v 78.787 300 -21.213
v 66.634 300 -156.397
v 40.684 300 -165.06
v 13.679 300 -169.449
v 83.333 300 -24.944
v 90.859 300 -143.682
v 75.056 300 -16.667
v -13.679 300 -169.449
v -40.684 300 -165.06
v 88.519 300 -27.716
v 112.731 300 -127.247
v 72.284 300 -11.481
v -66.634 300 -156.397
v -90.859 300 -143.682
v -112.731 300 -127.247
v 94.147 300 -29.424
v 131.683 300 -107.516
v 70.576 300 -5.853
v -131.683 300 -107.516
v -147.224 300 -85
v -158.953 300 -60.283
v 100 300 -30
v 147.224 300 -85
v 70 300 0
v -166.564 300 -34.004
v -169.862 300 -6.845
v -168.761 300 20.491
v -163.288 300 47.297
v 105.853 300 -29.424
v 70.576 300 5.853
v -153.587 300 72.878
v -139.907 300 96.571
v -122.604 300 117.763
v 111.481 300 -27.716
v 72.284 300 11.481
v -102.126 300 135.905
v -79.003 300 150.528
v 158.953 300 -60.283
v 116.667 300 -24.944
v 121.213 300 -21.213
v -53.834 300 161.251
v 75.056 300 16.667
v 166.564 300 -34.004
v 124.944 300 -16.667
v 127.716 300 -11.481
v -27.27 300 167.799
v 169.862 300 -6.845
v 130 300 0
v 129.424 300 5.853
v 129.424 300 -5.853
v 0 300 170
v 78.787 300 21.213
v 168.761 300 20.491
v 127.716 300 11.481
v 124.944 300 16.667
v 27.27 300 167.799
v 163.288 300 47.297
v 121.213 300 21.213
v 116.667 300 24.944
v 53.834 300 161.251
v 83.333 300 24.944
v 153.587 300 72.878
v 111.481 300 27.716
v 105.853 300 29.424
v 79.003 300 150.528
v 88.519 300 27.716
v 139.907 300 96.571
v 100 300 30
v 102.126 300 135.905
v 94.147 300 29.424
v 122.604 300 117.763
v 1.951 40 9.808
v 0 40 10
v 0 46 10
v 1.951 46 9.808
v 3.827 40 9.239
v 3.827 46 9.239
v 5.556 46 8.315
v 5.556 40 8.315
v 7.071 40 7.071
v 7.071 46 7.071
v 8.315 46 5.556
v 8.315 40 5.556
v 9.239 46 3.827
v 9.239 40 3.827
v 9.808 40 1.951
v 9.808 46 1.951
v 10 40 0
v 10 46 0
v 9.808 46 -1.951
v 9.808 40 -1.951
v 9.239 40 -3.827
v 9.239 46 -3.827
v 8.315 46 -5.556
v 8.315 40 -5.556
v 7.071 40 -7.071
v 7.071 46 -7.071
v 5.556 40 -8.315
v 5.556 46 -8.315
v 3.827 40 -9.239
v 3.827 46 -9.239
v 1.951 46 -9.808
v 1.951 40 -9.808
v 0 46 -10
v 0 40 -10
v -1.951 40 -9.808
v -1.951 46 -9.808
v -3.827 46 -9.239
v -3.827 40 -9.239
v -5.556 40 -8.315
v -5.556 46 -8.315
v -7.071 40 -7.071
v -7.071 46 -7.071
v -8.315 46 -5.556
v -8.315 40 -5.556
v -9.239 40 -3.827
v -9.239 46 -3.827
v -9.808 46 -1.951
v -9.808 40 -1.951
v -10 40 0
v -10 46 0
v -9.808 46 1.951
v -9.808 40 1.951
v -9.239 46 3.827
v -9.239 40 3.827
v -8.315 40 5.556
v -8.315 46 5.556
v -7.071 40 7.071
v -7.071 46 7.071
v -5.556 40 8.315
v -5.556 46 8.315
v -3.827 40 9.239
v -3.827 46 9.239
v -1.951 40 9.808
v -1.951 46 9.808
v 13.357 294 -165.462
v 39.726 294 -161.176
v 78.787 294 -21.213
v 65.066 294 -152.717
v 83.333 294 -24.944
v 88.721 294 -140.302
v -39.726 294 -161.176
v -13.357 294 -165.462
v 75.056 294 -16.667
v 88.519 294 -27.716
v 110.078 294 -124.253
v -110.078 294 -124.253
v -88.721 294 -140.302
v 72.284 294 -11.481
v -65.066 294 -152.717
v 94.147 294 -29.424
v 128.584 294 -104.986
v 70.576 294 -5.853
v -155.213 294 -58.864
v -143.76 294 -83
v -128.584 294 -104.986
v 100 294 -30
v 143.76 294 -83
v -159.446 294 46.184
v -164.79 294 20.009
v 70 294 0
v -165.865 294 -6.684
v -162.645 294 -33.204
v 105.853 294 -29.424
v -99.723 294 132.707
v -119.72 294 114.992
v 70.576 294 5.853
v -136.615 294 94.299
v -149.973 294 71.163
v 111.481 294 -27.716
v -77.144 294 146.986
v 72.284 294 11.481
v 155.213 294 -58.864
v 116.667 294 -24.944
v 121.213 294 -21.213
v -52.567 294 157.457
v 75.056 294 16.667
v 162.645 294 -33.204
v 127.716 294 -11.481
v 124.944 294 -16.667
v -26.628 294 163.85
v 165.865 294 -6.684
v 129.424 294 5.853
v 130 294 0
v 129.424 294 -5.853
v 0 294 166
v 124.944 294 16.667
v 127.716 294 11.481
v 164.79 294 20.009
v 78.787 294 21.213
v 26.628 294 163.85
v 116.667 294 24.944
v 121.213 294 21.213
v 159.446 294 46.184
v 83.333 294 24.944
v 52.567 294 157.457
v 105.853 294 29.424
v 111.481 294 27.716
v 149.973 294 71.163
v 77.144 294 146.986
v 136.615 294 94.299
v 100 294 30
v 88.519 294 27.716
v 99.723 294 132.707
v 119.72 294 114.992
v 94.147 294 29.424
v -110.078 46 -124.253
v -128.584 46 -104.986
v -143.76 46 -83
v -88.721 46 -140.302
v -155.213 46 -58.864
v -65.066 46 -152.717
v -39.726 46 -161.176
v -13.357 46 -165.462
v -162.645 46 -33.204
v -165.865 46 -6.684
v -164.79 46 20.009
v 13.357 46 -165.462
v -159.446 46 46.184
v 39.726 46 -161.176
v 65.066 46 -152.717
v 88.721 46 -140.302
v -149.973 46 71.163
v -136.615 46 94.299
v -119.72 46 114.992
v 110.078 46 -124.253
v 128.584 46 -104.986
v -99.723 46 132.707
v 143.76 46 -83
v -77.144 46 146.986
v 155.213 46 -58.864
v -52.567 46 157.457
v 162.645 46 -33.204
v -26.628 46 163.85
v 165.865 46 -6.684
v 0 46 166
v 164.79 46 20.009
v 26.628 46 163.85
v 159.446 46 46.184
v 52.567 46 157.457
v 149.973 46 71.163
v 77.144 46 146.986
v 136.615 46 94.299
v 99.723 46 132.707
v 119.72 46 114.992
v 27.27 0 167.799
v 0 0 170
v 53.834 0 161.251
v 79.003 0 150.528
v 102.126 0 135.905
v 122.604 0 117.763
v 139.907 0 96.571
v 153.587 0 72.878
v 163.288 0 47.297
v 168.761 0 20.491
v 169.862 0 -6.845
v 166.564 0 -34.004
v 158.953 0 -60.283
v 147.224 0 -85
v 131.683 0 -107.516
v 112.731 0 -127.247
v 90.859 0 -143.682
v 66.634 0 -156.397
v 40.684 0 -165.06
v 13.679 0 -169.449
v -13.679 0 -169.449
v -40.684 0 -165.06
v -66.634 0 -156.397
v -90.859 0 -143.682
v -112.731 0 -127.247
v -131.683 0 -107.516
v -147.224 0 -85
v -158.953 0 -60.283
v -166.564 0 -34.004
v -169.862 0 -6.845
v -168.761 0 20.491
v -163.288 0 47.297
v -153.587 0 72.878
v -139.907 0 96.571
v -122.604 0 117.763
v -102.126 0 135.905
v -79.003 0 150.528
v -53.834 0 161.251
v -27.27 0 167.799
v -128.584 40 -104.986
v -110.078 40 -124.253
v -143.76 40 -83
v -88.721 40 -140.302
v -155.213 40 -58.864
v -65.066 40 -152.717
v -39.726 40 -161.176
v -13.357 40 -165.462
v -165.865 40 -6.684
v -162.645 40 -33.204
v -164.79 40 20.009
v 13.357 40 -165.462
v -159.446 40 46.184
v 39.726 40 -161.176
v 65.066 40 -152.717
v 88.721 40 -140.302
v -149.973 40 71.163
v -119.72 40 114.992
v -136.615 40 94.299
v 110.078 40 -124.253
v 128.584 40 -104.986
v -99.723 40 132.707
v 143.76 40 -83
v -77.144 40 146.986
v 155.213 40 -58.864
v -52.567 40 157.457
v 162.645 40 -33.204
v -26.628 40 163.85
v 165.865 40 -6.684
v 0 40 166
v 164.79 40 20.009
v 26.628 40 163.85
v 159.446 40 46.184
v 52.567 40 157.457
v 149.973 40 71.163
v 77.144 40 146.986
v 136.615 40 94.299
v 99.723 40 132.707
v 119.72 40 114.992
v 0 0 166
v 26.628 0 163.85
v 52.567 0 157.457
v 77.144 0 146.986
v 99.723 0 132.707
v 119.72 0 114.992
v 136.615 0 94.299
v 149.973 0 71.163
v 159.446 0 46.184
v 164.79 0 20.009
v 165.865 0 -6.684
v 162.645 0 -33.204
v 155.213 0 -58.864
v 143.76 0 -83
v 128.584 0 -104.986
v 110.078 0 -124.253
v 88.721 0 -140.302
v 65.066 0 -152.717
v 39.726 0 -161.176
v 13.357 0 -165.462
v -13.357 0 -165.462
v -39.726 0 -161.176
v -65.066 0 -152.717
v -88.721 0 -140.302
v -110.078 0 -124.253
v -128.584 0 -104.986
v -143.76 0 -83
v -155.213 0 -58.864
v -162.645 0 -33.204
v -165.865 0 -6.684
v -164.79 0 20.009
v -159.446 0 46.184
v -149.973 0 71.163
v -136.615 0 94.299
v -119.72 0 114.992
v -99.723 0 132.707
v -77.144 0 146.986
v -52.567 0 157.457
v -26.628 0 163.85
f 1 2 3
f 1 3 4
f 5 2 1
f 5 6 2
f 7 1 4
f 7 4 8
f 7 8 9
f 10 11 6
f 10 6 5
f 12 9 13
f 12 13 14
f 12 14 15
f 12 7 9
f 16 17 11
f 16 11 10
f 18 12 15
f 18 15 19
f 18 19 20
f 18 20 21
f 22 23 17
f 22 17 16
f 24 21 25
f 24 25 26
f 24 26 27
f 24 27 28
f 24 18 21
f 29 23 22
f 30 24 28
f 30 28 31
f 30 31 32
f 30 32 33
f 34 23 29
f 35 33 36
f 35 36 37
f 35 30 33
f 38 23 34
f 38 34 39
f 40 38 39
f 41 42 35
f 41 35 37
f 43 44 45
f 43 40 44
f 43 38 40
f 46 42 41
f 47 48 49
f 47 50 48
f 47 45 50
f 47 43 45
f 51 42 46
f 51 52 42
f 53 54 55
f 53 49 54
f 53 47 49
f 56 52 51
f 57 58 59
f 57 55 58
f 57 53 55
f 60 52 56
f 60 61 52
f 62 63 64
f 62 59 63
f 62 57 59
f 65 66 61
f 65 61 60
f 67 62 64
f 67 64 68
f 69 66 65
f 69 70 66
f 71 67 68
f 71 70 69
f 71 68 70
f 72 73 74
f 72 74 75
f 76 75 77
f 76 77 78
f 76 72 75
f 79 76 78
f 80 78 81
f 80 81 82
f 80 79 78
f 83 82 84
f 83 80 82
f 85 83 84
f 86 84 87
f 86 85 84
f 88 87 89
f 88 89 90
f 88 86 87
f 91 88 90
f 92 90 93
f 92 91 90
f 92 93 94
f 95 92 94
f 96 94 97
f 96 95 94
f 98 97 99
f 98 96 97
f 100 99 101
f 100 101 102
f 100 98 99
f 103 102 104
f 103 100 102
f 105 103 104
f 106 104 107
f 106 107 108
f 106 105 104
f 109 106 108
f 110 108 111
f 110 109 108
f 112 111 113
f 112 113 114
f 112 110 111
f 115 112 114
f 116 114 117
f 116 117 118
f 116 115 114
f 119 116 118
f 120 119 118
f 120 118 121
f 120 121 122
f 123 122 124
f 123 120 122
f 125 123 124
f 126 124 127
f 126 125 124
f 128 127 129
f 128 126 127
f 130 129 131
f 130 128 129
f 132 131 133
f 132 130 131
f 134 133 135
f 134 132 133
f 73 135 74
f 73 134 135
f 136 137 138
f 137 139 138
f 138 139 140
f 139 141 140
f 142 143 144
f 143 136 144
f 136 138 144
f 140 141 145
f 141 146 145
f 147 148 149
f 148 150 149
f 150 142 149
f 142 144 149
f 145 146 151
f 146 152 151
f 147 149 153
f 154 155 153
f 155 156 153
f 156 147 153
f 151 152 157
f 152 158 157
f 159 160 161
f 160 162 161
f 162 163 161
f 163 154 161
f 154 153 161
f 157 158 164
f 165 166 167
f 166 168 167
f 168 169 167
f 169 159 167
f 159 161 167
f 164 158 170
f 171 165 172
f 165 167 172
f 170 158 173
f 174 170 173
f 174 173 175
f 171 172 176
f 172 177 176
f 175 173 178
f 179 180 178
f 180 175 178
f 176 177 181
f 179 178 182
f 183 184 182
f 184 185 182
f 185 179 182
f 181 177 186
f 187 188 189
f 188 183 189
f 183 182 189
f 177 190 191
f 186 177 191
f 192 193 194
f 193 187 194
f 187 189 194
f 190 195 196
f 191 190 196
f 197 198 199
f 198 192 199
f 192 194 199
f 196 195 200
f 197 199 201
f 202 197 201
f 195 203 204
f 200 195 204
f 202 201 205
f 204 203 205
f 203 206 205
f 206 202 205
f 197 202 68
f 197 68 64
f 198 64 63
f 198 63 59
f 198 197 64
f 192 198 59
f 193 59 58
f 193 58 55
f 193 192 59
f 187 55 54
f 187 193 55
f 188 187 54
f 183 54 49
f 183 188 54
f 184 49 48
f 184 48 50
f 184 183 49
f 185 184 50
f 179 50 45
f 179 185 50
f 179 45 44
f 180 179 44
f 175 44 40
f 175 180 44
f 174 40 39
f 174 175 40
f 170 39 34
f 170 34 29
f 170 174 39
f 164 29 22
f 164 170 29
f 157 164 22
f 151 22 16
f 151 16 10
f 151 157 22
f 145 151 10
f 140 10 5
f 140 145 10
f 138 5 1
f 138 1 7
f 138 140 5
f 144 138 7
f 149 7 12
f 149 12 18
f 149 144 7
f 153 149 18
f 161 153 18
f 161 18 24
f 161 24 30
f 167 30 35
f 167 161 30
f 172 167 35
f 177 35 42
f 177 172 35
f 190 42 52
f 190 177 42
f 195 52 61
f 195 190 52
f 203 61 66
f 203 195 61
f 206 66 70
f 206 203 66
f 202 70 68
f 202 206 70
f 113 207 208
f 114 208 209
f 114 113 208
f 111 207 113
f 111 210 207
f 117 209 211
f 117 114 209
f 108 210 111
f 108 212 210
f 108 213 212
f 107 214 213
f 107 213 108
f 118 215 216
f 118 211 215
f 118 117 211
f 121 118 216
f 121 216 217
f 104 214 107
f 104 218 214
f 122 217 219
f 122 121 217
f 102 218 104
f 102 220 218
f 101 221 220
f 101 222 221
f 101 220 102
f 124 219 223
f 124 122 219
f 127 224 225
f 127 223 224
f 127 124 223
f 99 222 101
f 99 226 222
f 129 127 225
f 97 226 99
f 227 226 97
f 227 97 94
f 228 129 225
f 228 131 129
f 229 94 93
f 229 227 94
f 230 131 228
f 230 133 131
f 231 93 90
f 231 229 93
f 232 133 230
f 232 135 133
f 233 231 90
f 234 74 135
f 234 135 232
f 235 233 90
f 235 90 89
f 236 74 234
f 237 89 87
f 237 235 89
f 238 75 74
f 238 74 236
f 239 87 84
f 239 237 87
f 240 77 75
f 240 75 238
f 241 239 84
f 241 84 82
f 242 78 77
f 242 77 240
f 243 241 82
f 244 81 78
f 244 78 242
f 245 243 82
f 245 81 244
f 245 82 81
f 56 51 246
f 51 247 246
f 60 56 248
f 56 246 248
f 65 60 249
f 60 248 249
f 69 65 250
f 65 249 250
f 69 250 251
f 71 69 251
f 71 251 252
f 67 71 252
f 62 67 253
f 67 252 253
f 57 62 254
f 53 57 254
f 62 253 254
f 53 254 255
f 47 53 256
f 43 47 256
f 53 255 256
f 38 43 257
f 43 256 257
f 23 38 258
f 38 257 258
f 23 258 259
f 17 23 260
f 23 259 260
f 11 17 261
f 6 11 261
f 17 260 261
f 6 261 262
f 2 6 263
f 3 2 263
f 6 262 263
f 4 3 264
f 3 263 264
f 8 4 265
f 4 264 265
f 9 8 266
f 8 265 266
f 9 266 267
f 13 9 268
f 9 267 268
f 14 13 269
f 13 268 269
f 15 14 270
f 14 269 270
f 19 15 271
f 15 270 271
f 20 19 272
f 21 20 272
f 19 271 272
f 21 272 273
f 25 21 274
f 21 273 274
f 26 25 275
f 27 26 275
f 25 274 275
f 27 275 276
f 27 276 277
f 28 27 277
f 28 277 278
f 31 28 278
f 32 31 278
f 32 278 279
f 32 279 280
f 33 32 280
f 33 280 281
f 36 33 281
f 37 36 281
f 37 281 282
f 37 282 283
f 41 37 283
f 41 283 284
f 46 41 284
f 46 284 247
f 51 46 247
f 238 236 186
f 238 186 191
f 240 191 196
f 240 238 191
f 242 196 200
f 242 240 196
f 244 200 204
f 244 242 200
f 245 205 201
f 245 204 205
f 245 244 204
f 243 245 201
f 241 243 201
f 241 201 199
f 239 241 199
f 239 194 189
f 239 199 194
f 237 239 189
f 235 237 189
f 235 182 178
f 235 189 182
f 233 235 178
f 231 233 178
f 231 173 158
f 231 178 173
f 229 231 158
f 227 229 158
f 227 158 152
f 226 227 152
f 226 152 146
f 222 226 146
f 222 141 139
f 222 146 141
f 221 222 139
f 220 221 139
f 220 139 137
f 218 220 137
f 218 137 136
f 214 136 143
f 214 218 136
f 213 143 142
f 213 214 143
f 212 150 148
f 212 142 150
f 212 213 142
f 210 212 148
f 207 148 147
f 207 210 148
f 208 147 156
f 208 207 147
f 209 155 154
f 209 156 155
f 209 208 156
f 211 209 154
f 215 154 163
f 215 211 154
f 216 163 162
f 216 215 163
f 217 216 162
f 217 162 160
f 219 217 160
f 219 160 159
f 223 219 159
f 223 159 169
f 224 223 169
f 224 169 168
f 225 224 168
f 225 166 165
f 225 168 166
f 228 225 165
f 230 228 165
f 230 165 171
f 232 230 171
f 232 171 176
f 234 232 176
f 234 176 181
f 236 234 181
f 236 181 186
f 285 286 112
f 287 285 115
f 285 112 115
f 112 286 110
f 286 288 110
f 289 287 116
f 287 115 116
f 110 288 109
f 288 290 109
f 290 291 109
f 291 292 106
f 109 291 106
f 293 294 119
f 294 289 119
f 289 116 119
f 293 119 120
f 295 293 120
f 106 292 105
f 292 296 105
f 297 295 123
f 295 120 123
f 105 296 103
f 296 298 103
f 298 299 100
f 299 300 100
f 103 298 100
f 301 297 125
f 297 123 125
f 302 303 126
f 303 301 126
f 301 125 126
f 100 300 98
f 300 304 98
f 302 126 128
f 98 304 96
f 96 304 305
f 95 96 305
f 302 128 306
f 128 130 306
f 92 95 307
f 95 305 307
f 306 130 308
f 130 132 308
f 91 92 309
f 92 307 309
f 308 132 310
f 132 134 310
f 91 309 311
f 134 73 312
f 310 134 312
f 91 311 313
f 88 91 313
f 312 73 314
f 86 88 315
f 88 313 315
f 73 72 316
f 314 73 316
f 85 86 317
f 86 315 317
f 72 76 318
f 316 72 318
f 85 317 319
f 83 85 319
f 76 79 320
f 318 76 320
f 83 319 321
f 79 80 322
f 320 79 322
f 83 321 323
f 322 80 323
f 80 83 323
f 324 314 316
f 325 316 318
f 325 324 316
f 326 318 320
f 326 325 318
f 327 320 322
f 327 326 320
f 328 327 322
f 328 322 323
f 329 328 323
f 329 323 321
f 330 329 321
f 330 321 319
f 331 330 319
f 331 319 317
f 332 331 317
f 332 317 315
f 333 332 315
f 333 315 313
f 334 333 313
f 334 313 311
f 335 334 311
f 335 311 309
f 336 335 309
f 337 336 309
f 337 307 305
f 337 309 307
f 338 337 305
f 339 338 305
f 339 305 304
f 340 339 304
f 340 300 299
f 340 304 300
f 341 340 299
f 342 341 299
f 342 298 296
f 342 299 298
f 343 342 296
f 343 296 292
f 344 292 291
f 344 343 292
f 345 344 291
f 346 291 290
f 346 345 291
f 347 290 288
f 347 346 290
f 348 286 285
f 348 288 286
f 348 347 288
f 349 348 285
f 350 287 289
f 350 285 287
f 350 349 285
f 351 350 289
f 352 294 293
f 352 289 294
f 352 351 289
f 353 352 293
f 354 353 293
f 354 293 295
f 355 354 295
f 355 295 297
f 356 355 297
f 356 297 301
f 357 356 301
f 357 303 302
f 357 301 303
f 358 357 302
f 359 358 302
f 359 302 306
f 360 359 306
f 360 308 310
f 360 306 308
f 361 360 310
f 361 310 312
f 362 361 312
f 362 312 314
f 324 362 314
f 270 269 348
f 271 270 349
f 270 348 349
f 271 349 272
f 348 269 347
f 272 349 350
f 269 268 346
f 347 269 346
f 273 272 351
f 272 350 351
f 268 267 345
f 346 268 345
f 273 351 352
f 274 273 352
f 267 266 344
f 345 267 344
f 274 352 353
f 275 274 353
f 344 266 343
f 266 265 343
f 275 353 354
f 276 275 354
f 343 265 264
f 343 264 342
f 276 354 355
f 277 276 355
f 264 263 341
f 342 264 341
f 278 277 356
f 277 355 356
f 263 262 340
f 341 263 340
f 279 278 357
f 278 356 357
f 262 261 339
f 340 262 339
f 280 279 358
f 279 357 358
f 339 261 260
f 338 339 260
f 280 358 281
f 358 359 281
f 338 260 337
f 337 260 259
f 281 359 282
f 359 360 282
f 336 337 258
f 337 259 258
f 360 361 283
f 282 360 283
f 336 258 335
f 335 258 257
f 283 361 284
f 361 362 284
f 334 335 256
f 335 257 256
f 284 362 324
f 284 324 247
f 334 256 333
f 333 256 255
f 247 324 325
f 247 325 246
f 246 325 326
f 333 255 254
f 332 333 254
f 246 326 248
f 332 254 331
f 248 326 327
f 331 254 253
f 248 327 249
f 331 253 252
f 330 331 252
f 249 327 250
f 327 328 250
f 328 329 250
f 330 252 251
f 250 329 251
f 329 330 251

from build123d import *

# Parameters (mm, degrees)
RESERVOIR_WALL_SKETCH_R    = 170
RESERVOIR_WALL_SKETCH_R_2  = 166
RESERVOIR_WALL_SKIRT_DEPTH = 300
RESERVOIR_START            = 40
RESERVOIR_FLOOR_SKETCH_R   = 170
RESERVOIR_FLOOR_SKETCH_R_2 = 10
RESERVOIR_FLOOR_DEPTH      = 6
SEALED_START               = 294
SEALED_LID_SKETCH_R        = 170
SEALED_LID_SKETCH_R_2      = 30
SEALED_LID_DEPTH           = 6


with BuildPart() as part:
    # Reservoir Wall Sketch → Reservoir Wall + Skirt (new body)
    with BuildSketch(Plane(origin=(0, 0, 0), x_dir=(1, 0, 0), z_dir=(0, 1, 0))):
        with Locations(Location((0, 0, 0), (0, 0, 270))):
            Circle(RESERVOIR_WALL_SKETCH_R)
        with Locations(Location((0, 0, 0), (0, 0, 270))):
            Circle(RESERVOIR_WALL_SKETCH_R_2, mode=Mode.SUBTRACT)
    extrude(amount=RESERVOIR_WALL_SKIRT_DEPTH)

    # Reservoir Floor Sketch → Reservoir Floor (add)
    with BuildSketch(Plane(origin=(0, 0, 0), x_dir=(1, 0, 0), z_dir=(0, 1, 0)).offset(RESERVOIR_START)):
        with Locations(Location((0, 0, 0), (0, 0, 270))):
            Circle(RESERVOIR_FLOOR_SKETCH_R)
        with Locations(Location((0, 0, 0), (0, 0, 270))):
            Circle(RESERVOIR_FLOOR_SKETCH_R_2, mode=Mode.SUBTRACT)
    extrude(amount=RESERVOIR_FLOOR_DEPTH)

    # Sealed Lid Sketch → Sealed Lid (add)
    with BuildSketch(Plane(origin=(0, 0, 0), x_dir=(1, 0, 0), z_dir=(0, 1, 0)).offset(SEALED_START)):
        with Locations(Location((0, 0, 0), (0, 0, 270))):
            Circle(SEALED_LID_SKETCH_R)
        with Locations(Location((100, 0, 0), (0, 0, 270))):
            Circle(SEALED_LID_SKETCH_R_2, mode=Mode.SUBTRACT)
    extrude(amount=SEALED_LID_DEPTH)


solid = part.part
